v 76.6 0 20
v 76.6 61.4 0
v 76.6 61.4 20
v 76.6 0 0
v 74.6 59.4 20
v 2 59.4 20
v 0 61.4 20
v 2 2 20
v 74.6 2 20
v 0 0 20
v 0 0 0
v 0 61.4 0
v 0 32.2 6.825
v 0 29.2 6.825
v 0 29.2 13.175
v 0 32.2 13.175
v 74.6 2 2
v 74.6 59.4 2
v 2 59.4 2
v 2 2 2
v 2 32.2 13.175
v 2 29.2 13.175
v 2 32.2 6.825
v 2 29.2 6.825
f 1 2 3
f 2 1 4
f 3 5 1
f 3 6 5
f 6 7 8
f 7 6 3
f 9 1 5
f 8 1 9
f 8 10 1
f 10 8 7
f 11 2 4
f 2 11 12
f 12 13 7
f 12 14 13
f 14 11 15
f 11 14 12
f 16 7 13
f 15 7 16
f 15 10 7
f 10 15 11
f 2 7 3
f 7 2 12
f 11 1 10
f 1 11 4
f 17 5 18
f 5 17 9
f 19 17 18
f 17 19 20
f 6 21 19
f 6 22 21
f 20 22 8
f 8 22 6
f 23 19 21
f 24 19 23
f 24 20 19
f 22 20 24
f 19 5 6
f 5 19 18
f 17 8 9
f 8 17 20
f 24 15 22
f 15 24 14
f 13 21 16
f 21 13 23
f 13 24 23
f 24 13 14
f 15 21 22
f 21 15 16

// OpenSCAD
// ============================================================================
// Arduino Protection Case
// Purpose: Board-specific snug case with optional screen cutout and fan mount.
// Units: millimetres (mm)
// ============================================================================

/* ----------------------------- USER PARAMETERS -------------------------------- */
board_type = "Uno";       // Board type: "Uno", "Nano", or "Mega"
case_height = 20;         // case height (mm)
wall_thickness = 2;       // wall thickness (mm)
port_clearance = 2;       // extra space around board (mm)
include_screen_cutout = false; // add screen window on top
include_fan_mount = false;     // add fan mounting hole on top
clearance = 0.35;         // fit tolerance

/* ------------------------- Board Dimensions (Built-in) ------------------------ */
// Arduino Uno dimensions
board_length = board_type == "Uno" ? 68.6 : 
               board_type == "Nano" ? 45.0 : 
               board_type == "Mega" ? 101.5 : 68.6;
               
board_width = board_type == "Uno" ? 53.4 : 
              board_type == "Nano" ? 18.0 : 
              board_type == "Mega" ? 53.3 : 53.4;

/* ------------------------- Assertions & Limits ---------------------------- */
assert(board_length > 0 && board_width > 0, "Board dims > 0");
assert(case_height >= 12, "Case height should be ≥ 12mm");
assert(wall_thickness >= 1.6, "Wall thickness ≥ 1.6mm recommended");

/* ------------------------- Derived Measurements --------------------------- */
inner_length = board_length + 2*port_clearance;
inner_width  = board_width  + 2*port_clearance;

/* ------------------------------ Modules ---------------------------------- */
module arduino_case() {
  difference() {
    // Outer shell
    cube([inner_length + 2*wall_thickness, inner_width + 2*wall_thickness, case_height], center=false);

    // Hollow
    translate([wall_thickness, wall_thickness, wall_thickness])
      cube([inner_length, inner_width, case_height - wall_thickness], center=false);

    // Simple side port cutout (USB side)
    translate([0, (inner_width/2) + wall_thickness, case_height/2])
      rotate([90,0,0])
      cube([12 + clearance, 6 + clearance, wall_thickness + 1], center=true);

    // Screen window (top)
    if (include_screen_cutout) {
      translate([ (inner_length/2) + wall_thickness, (inner_width/2) + wall_thickness, case_height + 0.5 ])
        rotate([90,0,0])
        cylinder(d=18 + clearance, h=wall_thickness + 1, $fn=64);
    }

    // Fan mount (top)
    if (include_fan_mount) {
      translate([ (inner_length/2) + wall_thickness, (inner_width/2) + wall_thickness, case_height + 0.5 ])
        rotate([90,0,0])
        cylinder(d=30 + clearance, h=wall_thickness + 1, $fn=96);
    }
  }
}

/* --------------------------------- Call ---------------------------------- */
arduino_case();

/* ============================== HOW TO PRINT / ORIENT ============================== */
// Print orientation: Bottom down on build plate (opening facing up)
// Supports: None needed
// Layer height: 0.2mm for good detail
// Infill: 20% for protection strength
// Print speed: Normal (50mm/s)
// Post-processing: Test fit board, may need light filing of port opening
